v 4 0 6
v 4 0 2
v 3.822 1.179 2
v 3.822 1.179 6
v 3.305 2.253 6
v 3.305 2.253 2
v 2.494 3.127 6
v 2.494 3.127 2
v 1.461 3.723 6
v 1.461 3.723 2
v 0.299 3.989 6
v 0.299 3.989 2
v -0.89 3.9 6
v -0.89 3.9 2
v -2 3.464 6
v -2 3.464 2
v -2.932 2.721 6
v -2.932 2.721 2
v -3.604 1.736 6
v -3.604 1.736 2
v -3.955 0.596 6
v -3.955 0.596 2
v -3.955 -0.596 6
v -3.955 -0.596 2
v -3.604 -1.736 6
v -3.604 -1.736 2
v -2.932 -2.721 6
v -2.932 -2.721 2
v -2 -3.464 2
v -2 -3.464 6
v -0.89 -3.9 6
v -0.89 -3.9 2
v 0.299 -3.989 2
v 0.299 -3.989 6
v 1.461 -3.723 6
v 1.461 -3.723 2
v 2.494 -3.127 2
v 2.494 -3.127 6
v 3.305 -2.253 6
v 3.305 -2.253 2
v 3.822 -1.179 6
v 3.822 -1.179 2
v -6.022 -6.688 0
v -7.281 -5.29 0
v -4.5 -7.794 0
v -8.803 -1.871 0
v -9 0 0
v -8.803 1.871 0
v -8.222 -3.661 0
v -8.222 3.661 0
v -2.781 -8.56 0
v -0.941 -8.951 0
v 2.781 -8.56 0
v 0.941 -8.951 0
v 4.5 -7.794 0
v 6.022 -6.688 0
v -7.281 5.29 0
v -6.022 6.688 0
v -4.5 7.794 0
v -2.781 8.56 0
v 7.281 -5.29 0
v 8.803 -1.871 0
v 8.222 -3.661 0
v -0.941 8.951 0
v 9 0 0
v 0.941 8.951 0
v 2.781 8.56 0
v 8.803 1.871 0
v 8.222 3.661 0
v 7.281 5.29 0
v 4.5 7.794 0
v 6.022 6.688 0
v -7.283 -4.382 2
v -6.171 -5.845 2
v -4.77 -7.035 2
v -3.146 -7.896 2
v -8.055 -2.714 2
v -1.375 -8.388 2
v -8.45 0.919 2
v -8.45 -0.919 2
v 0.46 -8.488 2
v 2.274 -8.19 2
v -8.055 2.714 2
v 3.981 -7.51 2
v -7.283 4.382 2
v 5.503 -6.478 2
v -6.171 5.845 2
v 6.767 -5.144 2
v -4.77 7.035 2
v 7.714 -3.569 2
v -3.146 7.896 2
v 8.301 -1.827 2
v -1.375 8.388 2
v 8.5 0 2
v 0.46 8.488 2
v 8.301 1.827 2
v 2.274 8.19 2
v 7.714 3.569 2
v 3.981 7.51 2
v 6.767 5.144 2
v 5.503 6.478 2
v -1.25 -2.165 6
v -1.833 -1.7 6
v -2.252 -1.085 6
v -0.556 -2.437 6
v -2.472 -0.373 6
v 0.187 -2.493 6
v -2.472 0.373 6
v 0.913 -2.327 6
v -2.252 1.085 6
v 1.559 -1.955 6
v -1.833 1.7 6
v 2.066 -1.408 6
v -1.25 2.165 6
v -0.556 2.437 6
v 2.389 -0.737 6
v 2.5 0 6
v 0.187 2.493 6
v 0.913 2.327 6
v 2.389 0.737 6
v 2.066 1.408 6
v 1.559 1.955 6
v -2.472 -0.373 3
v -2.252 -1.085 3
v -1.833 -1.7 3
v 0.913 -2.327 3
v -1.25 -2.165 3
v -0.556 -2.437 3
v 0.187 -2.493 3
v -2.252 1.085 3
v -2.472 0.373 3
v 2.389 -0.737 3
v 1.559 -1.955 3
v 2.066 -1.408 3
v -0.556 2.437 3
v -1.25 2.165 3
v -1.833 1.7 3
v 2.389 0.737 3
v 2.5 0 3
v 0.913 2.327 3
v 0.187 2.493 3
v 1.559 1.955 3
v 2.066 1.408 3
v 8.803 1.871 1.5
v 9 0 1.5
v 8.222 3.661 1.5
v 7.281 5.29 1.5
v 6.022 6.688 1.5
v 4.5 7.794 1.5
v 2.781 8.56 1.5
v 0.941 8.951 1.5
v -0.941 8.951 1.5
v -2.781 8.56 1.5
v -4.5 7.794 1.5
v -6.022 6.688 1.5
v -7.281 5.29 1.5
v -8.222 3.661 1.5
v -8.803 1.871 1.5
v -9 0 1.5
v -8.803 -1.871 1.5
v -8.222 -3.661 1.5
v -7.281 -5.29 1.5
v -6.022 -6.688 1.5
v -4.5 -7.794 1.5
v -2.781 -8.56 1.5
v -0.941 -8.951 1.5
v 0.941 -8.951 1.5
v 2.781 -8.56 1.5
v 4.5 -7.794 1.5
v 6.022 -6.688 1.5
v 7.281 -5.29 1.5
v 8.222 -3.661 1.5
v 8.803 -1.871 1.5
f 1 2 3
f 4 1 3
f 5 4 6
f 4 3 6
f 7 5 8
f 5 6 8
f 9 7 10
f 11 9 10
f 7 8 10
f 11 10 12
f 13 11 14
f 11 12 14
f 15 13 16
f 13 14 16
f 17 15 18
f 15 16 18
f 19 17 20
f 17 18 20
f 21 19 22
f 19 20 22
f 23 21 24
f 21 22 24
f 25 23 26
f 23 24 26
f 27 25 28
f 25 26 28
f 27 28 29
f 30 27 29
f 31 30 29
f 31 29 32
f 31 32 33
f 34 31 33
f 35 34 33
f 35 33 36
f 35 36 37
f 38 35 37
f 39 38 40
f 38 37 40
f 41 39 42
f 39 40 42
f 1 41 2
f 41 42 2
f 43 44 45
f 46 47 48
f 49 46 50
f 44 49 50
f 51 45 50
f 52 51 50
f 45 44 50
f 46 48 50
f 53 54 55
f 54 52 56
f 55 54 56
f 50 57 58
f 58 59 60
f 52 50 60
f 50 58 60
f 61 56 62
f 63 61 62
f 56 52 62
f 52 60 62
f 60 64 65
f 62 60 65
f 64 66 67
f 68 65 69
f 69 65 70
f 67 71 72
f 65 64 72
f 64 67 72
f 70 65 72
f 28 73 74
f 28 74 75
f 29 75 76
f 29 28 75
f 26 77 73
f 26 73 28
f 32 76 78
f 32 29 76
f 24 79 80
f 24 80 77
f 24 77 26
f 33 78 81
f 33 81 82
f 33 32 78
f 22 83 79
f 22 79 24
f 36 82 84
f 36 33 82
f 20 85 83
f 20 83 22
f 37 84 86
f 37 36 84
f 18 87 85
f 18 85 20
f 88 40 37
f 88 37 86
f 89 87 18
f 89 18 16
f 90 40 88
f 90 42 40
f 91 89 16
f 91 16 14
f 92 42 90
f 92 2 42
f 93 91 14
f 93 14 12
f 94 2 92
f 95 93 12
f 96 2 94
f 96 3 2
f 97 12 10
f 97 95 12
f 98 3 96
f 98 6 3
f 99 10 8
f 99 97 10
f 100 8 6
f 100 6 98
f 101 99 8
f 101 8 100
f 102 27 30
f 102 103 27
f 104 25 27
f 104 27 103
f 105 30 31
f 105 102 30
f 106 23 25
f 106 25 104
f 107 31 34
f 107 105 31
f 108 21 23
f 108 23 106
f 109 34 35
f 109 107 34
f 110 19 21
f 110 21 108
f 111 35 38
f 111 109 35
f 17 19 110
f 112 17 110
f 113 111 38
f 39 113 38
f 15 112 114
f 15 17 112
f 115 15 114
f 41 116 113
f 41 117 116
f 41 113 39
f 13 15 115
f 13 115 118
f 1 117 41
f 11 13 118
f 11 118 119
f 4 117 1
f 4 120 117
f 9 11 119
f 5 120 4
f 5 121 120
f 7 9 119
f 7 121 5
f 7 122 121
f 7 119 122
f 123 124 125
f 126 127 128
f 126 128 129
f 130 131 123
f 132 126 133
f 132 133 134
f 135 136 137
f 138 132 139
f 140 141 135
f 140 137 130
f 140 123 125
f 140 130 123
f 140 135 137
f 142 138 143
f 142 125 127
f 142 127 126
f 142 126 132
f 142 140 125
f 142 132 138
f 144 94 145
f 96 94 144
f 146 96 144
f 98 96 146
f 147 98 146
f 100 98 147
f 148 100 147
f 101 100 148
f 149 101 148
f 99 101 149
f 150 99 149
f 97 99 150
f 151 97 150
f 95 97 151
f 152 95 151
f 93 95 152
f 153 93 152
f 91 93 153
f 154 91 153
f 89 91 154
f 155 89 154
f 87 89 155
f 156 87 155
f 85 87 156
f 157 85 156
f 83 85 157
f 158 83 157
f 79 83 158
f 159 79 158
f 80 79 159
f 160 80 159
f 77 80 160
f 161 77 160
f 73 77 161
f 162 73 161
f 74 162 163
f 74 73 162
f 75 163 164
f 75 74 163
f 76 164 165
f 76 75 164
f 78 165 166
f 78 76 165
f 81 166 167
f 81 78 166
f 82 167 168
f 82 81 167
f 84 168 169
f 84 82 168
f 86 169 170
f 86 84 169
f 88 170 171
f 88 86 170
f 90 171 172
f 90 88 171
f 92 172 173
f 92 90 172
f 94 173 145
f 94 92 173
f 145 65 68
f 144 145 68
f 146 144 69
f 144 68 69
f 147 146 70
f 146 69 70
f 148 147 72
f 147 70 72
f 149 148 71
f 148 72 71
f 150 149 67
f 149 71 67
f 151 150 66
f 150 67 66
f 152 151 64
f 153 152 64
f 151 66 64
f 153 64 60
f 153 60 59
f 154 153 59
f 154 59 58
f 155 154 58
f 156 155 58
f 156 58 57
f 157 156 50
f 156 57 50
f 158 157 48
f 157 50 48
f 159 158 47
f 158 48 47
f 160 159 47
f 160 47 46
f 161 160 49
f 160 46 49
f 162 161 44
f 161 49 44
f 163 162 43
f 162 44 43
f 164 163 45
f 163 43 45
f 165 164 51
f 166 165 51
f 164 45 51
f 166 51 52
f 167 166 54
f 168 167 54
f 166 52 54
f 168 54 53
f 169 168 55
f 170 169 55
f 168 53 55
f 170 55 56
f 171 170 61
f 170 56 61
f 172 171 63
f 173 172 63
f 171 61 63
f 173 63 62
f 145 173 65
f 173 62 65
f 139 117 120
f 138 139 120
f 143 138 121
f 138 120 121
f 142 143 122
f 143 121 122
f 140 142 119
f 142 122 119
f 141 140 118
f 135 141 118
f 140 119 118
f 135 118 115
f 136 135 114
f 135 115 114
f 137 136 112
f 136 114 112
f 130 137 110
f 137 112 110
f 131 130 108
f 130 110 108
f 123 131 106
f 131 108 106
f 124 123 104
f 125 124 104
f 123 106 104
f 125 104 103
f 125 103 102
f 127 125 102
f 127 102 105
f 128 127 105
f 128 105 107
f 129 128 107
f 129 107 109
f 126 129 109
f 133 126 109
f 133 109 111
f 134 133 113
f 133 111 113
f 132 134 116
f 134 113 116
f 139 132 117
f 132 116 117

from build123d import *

# Parameters (mm, degrees)
F0_R     = 9
F1_DEPTH = 2
F2_R     = 4
F3_DEPTH = 4
F4_R     = 2.5
F5_DEPTH = 3
F6_SIZE  = 0.5


with BuildPart() as f1:
    # F0 (on Top) → F1 (new body)
    with BuildSketch(Plane.XY):
        Circle(F0_R)
    extrude(amount=F1_DEPTH)

    # F2 (on face) → F3 (join)
    with BuildSketch(Plane.XY.offset(2)):
        Circle(F2_R)
    extrude(amount=F3_DEPTH)

    # F4 (on face) → F5 (cut)
    with BuildSketch(Plane.XY.offset(6)):
        Circle(F4_R)
    extrude(amount=-F5_DEPTH, mode=Mode.SUBTRACT)

    # F6
    f6_edges = [f1.edges().sort_by_distance(p)[0] for p in [
        (-9, 0, 2),
    ]]
    chamfer(f6_edges, length=F6_SIZE)


solid = f1.part
